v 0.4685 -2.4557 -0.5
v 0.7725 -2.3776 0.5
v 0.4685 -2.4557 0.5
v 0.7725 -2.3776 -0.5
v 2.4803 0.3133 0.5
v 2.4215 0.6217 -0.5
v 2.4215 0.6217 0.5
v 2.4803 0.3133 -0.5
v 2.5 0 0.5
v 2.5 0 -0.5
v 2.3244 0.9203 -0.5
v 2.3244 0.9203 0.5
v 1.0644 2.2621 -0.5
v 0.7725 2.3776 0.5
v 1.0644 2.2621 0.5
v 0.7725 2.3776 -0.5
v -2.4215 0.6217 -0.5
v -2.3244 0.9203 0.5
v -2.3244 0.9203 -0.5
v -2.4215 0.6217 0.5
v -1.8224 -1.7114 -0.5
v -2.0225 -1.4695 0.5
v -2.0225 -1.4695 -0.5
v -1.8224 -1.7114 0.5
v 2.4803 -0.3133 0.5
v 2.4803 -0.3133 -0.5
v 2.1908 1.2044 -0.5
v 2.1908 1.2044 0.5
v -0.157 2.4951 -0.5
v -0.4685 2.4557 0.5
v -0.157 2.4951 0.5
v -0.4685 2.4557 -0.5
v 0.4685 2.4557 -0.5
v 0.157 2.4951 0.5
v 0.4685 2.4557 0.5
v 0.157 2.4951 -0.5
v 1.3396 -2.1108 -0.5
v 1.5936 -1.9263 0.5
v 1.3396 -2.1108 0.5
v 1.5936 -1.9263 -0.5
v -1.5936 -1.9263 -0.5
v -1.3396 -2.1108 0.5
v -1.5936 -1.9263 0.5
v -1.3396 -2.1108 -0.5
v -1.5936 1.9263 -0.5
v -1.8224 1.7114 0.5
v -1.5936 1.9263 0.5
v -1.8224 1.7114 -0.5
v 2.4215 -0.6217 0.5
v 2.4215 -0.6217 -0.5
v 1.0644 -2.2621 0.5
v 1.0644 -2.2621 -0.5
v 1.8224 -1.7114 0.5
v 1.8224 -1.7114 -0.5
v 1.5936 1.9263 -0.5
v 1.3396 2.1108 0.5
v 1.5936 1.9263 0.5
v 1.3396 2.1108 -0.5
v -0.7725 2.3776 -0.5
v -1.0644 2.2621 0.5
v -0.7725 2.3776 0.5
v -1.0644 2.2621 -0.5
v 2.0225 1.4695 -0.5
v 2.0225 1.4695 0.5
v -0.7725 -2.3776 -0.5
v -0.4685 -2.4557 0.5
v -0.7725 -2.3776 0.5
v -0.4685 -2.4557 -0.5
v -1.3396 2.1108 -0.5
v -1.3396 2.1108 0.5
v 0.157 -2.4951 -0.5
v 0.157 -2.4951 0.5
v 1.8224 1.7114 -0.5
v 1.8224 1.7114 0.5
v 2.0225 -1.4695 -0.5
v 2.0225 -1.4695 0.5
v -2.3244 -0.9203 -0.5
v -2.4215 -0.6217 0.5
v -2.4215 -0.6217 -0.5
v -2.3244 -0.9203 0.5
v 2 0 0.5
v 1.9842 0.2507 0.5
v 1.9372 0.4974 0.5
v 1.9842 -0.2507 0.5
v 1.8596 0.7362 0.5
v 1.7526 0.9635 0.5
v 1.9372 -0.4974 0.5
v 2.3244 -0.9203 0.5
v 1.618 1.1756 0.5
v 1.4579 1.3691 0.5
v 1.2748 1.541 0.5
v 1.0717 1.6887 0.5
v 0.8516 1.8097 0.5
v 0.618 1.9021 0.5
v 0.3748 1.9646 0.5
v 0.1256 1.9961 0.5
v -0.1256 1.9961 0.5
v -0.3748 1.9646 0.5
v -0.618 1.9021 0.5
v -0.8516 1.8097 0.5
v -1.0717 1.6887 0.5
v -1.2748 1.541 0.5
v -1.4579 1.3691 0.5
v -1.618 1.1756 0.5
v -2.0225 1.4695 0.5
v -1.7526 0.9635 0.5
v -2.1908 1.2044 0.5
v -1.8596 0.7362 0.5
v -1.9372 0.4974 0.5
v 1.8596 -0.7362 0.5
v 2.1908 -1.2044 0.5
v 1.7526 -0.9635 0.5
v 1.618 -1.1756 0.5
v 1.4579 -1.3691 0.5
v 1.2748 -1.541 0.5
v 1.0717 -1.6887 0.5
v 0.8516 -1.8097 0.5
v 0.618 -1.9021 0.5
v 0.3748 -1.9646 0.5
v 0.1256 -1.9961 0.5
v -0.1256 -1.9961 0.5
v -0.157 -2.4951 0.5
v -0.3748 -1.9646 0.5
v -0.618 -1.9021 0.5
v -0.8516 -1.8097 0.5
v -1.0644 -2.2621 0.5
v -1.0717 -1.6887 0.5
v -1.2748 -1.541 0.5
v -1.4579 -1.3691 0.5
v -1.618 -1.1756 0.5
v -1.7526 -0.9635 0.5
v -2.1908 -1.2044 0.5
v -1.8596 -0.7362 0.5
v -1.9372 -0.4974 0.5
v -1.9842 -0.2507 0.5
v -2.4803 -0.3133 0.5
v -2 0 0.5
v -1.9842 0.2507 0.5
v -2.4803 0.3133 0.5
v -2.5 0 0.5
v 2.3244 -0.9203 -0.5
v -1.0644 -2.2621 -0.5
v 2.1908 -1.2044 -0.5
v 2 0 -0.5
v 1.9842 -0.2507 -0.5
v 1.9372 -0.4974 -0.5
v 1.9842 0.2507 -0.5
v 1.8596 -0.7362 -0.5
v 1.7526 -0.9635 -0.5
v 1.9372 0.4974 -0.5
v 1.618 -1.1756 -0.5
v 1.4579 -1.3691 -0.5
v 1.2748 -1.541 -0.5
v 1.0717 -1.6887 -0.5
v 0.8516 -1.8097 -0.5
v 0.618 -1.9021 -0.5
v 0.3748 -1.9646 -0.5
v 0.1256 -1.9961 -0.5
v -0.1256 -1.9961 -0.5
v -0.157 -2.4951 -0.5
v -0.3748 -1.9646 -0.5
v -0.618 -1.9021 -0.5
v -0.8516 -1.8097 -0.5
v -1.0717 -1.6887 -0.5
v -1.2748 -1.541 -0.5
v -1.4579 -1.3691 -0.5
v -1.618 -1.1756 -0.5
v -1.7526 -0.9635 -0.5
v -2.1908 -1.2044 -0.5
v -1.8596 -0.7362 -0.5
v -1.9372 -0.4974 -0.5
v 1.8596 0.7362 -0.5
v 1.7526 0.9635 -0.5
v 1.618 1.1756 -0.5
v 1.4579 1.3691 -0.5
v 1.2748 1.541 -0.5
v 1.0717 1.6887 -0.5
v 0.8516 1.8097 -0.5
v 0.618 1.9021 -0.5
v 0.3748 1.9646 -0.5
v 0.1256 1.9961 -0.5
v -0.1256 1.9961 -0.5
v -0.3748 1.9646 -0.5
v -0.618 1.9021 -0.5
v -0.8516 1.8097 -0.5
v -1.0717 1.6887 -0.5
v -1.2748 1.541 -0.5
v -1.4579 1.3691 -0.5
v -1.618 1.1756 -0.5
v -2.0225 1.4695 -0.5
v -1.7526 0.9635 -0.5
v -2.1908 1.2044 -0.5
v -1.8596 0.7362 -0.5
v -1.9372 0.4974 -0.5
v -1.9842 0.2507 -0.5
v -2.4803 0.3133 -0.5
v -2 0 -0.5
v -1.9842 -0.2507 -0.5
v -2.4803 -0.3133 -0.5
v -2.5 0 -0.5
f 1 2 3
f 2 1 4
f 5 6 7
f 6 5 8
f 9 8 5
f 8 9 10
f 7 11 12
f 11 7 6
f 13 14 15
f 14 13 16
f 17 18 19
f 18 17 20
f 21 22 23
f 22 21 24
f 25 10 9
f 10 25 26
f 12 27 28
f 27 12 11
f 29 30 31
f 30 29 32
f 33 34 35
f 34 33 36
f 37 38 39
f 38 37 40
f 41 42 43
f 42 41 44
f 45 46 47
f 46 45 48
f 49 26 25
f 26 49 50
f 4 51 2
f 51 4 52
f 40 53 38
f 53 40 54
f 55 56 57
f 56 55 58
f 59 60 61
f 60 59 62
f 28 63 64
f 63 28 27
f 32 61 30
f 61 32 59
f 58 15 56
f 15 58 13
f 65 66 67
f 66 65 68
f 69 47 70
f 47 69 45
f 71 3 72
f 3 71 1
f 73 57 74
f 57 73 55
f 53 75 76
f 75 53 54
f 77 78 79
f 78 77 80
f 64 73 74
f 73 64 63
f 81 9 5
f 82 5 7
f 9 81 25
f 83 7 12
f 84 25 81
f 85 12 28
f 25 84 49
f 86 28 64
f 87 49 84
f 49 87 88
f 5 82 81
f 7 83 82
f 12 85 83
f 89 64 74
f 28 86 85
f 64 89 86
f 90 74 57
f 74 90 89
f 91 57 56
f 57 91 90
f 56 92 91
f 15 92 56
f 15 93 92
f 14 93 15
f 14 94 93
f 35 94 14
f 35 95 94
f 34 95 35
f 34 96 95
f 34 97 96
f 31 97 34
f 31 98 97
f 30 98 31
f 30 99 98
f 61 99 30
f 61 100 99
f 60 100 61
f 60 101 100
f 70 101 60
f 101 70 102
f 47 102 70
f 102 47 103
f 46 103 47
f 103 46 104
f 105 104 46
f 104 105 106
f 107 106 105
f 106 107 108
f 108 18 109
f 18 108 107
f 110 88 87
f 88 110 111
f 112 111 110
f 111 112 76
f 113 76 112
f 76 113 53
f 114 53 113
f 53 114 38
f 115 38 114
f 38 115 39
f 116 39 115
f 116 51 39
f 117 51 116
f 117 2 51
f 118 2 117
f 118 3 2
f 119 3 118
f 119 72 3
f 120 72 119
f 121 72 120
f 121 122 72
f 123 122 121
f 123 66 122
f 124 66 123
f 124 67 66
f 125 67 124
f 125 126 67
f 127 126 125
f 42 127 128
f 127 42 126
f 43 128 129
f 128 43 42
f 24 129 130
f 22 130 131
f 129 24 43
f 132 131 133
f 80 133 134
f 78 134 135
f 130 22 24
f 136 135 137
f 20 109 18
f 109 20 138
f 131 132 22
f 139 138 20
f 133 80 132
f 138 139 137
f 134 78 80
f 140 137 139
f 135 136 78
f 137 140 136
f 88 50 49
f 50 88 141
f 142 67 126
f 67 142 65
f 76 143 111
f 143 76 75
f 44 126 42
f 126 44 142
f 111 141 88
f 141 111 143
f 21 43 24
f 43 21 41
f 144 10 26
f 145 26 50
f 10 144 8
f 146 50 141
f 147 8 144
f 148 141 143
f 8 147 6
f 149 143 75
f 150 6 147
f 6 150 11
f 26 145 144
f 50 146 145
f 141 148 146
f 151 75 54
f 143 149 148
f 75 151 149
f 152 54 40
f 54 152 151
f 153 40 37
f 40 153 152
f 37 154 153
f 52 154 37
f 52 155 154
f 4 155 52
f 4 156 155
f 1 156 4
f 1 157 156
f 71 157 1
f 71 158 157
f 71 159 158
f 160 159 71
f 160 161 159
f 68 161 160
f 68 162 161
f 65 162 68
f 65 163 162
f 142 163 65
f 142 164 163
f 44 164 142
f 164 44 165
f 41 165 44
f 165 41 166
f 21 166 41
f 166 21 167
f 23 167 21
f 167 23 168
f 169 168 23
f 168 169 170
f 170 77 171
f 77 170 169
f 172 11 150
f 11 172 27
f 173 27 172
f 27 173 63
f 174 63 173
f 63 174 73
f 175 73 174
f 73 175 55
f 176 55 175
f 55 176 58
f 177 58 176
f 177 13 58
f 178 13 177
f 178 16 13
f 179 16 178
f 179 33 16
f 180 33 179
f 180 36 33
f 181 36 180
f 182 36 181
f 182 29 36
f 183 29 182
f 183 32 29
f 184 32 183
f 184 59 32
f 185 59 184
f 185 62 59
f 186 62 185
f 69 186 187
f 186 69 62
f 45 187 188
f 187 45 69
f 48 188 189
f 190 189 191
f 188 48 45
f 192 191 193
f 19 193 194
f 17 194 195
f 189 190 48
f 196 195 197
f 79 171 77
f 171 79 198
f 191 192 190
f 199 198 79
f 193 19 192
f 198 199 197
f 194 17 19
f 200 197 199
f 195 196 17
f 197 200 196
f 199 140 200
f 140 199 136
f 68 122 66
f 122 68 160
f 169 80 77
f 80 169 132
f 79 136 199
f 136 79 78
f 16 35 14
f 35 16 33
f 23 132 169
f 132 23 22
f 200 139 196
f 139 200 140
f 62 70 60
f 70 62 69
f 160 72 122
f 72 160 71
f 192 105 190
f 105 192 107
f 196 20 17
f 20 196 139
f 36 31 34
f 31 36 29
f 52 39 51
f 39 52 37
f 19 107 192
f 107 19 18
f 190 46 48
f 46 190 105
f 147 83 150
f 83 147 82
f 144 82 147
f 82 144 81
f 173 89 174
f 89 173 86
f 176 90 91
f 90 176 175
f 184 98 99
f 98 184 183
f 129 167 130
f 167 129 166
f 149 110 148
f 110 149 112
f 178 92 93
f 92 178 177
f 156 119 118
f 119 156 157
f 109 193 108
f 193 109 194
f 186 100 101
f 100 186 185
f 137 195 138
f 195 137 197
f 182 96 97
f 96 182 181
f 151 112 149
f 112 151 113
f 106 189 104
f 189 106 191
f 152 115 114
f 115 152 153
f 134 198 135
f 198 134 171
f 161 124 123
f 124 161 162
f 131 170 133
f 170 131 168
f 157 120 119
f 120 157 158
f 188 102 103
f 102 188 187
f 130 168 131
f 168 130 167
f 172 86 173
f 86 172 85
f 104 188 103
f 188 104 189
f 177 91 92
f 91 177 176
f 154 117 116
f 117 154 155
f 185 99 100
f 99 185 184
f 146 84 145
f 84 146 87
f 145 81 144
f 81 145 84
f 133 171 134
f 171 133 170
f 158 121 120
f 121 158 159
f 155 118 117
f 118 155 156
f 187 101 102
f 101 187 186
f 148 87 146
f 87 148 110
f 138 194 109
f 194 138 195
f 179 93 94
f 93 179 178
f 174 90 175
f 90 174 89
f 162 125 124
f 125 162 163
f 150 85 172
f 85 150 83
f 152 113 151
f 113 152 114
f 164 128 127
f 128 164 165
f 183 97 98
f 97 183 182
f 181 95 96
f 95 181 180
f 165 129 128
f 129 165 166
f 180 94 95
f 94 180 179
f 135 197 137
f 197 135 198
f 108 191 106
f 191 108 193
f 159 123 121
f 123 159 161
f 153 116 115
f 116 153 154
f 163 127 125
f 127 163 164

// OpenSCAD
$fn = 50;


difference() {
	union() {
		translate(v = [0, 0, -0.5000000000]) {
			cylinder(h = 1, r = 2.5000000000);
		}
	}
	union() {
		translate(v = [0, 0, -100.0000000000]) {
			cylinder(h = 200, r = 2.0000000000);
		}
	}
}
